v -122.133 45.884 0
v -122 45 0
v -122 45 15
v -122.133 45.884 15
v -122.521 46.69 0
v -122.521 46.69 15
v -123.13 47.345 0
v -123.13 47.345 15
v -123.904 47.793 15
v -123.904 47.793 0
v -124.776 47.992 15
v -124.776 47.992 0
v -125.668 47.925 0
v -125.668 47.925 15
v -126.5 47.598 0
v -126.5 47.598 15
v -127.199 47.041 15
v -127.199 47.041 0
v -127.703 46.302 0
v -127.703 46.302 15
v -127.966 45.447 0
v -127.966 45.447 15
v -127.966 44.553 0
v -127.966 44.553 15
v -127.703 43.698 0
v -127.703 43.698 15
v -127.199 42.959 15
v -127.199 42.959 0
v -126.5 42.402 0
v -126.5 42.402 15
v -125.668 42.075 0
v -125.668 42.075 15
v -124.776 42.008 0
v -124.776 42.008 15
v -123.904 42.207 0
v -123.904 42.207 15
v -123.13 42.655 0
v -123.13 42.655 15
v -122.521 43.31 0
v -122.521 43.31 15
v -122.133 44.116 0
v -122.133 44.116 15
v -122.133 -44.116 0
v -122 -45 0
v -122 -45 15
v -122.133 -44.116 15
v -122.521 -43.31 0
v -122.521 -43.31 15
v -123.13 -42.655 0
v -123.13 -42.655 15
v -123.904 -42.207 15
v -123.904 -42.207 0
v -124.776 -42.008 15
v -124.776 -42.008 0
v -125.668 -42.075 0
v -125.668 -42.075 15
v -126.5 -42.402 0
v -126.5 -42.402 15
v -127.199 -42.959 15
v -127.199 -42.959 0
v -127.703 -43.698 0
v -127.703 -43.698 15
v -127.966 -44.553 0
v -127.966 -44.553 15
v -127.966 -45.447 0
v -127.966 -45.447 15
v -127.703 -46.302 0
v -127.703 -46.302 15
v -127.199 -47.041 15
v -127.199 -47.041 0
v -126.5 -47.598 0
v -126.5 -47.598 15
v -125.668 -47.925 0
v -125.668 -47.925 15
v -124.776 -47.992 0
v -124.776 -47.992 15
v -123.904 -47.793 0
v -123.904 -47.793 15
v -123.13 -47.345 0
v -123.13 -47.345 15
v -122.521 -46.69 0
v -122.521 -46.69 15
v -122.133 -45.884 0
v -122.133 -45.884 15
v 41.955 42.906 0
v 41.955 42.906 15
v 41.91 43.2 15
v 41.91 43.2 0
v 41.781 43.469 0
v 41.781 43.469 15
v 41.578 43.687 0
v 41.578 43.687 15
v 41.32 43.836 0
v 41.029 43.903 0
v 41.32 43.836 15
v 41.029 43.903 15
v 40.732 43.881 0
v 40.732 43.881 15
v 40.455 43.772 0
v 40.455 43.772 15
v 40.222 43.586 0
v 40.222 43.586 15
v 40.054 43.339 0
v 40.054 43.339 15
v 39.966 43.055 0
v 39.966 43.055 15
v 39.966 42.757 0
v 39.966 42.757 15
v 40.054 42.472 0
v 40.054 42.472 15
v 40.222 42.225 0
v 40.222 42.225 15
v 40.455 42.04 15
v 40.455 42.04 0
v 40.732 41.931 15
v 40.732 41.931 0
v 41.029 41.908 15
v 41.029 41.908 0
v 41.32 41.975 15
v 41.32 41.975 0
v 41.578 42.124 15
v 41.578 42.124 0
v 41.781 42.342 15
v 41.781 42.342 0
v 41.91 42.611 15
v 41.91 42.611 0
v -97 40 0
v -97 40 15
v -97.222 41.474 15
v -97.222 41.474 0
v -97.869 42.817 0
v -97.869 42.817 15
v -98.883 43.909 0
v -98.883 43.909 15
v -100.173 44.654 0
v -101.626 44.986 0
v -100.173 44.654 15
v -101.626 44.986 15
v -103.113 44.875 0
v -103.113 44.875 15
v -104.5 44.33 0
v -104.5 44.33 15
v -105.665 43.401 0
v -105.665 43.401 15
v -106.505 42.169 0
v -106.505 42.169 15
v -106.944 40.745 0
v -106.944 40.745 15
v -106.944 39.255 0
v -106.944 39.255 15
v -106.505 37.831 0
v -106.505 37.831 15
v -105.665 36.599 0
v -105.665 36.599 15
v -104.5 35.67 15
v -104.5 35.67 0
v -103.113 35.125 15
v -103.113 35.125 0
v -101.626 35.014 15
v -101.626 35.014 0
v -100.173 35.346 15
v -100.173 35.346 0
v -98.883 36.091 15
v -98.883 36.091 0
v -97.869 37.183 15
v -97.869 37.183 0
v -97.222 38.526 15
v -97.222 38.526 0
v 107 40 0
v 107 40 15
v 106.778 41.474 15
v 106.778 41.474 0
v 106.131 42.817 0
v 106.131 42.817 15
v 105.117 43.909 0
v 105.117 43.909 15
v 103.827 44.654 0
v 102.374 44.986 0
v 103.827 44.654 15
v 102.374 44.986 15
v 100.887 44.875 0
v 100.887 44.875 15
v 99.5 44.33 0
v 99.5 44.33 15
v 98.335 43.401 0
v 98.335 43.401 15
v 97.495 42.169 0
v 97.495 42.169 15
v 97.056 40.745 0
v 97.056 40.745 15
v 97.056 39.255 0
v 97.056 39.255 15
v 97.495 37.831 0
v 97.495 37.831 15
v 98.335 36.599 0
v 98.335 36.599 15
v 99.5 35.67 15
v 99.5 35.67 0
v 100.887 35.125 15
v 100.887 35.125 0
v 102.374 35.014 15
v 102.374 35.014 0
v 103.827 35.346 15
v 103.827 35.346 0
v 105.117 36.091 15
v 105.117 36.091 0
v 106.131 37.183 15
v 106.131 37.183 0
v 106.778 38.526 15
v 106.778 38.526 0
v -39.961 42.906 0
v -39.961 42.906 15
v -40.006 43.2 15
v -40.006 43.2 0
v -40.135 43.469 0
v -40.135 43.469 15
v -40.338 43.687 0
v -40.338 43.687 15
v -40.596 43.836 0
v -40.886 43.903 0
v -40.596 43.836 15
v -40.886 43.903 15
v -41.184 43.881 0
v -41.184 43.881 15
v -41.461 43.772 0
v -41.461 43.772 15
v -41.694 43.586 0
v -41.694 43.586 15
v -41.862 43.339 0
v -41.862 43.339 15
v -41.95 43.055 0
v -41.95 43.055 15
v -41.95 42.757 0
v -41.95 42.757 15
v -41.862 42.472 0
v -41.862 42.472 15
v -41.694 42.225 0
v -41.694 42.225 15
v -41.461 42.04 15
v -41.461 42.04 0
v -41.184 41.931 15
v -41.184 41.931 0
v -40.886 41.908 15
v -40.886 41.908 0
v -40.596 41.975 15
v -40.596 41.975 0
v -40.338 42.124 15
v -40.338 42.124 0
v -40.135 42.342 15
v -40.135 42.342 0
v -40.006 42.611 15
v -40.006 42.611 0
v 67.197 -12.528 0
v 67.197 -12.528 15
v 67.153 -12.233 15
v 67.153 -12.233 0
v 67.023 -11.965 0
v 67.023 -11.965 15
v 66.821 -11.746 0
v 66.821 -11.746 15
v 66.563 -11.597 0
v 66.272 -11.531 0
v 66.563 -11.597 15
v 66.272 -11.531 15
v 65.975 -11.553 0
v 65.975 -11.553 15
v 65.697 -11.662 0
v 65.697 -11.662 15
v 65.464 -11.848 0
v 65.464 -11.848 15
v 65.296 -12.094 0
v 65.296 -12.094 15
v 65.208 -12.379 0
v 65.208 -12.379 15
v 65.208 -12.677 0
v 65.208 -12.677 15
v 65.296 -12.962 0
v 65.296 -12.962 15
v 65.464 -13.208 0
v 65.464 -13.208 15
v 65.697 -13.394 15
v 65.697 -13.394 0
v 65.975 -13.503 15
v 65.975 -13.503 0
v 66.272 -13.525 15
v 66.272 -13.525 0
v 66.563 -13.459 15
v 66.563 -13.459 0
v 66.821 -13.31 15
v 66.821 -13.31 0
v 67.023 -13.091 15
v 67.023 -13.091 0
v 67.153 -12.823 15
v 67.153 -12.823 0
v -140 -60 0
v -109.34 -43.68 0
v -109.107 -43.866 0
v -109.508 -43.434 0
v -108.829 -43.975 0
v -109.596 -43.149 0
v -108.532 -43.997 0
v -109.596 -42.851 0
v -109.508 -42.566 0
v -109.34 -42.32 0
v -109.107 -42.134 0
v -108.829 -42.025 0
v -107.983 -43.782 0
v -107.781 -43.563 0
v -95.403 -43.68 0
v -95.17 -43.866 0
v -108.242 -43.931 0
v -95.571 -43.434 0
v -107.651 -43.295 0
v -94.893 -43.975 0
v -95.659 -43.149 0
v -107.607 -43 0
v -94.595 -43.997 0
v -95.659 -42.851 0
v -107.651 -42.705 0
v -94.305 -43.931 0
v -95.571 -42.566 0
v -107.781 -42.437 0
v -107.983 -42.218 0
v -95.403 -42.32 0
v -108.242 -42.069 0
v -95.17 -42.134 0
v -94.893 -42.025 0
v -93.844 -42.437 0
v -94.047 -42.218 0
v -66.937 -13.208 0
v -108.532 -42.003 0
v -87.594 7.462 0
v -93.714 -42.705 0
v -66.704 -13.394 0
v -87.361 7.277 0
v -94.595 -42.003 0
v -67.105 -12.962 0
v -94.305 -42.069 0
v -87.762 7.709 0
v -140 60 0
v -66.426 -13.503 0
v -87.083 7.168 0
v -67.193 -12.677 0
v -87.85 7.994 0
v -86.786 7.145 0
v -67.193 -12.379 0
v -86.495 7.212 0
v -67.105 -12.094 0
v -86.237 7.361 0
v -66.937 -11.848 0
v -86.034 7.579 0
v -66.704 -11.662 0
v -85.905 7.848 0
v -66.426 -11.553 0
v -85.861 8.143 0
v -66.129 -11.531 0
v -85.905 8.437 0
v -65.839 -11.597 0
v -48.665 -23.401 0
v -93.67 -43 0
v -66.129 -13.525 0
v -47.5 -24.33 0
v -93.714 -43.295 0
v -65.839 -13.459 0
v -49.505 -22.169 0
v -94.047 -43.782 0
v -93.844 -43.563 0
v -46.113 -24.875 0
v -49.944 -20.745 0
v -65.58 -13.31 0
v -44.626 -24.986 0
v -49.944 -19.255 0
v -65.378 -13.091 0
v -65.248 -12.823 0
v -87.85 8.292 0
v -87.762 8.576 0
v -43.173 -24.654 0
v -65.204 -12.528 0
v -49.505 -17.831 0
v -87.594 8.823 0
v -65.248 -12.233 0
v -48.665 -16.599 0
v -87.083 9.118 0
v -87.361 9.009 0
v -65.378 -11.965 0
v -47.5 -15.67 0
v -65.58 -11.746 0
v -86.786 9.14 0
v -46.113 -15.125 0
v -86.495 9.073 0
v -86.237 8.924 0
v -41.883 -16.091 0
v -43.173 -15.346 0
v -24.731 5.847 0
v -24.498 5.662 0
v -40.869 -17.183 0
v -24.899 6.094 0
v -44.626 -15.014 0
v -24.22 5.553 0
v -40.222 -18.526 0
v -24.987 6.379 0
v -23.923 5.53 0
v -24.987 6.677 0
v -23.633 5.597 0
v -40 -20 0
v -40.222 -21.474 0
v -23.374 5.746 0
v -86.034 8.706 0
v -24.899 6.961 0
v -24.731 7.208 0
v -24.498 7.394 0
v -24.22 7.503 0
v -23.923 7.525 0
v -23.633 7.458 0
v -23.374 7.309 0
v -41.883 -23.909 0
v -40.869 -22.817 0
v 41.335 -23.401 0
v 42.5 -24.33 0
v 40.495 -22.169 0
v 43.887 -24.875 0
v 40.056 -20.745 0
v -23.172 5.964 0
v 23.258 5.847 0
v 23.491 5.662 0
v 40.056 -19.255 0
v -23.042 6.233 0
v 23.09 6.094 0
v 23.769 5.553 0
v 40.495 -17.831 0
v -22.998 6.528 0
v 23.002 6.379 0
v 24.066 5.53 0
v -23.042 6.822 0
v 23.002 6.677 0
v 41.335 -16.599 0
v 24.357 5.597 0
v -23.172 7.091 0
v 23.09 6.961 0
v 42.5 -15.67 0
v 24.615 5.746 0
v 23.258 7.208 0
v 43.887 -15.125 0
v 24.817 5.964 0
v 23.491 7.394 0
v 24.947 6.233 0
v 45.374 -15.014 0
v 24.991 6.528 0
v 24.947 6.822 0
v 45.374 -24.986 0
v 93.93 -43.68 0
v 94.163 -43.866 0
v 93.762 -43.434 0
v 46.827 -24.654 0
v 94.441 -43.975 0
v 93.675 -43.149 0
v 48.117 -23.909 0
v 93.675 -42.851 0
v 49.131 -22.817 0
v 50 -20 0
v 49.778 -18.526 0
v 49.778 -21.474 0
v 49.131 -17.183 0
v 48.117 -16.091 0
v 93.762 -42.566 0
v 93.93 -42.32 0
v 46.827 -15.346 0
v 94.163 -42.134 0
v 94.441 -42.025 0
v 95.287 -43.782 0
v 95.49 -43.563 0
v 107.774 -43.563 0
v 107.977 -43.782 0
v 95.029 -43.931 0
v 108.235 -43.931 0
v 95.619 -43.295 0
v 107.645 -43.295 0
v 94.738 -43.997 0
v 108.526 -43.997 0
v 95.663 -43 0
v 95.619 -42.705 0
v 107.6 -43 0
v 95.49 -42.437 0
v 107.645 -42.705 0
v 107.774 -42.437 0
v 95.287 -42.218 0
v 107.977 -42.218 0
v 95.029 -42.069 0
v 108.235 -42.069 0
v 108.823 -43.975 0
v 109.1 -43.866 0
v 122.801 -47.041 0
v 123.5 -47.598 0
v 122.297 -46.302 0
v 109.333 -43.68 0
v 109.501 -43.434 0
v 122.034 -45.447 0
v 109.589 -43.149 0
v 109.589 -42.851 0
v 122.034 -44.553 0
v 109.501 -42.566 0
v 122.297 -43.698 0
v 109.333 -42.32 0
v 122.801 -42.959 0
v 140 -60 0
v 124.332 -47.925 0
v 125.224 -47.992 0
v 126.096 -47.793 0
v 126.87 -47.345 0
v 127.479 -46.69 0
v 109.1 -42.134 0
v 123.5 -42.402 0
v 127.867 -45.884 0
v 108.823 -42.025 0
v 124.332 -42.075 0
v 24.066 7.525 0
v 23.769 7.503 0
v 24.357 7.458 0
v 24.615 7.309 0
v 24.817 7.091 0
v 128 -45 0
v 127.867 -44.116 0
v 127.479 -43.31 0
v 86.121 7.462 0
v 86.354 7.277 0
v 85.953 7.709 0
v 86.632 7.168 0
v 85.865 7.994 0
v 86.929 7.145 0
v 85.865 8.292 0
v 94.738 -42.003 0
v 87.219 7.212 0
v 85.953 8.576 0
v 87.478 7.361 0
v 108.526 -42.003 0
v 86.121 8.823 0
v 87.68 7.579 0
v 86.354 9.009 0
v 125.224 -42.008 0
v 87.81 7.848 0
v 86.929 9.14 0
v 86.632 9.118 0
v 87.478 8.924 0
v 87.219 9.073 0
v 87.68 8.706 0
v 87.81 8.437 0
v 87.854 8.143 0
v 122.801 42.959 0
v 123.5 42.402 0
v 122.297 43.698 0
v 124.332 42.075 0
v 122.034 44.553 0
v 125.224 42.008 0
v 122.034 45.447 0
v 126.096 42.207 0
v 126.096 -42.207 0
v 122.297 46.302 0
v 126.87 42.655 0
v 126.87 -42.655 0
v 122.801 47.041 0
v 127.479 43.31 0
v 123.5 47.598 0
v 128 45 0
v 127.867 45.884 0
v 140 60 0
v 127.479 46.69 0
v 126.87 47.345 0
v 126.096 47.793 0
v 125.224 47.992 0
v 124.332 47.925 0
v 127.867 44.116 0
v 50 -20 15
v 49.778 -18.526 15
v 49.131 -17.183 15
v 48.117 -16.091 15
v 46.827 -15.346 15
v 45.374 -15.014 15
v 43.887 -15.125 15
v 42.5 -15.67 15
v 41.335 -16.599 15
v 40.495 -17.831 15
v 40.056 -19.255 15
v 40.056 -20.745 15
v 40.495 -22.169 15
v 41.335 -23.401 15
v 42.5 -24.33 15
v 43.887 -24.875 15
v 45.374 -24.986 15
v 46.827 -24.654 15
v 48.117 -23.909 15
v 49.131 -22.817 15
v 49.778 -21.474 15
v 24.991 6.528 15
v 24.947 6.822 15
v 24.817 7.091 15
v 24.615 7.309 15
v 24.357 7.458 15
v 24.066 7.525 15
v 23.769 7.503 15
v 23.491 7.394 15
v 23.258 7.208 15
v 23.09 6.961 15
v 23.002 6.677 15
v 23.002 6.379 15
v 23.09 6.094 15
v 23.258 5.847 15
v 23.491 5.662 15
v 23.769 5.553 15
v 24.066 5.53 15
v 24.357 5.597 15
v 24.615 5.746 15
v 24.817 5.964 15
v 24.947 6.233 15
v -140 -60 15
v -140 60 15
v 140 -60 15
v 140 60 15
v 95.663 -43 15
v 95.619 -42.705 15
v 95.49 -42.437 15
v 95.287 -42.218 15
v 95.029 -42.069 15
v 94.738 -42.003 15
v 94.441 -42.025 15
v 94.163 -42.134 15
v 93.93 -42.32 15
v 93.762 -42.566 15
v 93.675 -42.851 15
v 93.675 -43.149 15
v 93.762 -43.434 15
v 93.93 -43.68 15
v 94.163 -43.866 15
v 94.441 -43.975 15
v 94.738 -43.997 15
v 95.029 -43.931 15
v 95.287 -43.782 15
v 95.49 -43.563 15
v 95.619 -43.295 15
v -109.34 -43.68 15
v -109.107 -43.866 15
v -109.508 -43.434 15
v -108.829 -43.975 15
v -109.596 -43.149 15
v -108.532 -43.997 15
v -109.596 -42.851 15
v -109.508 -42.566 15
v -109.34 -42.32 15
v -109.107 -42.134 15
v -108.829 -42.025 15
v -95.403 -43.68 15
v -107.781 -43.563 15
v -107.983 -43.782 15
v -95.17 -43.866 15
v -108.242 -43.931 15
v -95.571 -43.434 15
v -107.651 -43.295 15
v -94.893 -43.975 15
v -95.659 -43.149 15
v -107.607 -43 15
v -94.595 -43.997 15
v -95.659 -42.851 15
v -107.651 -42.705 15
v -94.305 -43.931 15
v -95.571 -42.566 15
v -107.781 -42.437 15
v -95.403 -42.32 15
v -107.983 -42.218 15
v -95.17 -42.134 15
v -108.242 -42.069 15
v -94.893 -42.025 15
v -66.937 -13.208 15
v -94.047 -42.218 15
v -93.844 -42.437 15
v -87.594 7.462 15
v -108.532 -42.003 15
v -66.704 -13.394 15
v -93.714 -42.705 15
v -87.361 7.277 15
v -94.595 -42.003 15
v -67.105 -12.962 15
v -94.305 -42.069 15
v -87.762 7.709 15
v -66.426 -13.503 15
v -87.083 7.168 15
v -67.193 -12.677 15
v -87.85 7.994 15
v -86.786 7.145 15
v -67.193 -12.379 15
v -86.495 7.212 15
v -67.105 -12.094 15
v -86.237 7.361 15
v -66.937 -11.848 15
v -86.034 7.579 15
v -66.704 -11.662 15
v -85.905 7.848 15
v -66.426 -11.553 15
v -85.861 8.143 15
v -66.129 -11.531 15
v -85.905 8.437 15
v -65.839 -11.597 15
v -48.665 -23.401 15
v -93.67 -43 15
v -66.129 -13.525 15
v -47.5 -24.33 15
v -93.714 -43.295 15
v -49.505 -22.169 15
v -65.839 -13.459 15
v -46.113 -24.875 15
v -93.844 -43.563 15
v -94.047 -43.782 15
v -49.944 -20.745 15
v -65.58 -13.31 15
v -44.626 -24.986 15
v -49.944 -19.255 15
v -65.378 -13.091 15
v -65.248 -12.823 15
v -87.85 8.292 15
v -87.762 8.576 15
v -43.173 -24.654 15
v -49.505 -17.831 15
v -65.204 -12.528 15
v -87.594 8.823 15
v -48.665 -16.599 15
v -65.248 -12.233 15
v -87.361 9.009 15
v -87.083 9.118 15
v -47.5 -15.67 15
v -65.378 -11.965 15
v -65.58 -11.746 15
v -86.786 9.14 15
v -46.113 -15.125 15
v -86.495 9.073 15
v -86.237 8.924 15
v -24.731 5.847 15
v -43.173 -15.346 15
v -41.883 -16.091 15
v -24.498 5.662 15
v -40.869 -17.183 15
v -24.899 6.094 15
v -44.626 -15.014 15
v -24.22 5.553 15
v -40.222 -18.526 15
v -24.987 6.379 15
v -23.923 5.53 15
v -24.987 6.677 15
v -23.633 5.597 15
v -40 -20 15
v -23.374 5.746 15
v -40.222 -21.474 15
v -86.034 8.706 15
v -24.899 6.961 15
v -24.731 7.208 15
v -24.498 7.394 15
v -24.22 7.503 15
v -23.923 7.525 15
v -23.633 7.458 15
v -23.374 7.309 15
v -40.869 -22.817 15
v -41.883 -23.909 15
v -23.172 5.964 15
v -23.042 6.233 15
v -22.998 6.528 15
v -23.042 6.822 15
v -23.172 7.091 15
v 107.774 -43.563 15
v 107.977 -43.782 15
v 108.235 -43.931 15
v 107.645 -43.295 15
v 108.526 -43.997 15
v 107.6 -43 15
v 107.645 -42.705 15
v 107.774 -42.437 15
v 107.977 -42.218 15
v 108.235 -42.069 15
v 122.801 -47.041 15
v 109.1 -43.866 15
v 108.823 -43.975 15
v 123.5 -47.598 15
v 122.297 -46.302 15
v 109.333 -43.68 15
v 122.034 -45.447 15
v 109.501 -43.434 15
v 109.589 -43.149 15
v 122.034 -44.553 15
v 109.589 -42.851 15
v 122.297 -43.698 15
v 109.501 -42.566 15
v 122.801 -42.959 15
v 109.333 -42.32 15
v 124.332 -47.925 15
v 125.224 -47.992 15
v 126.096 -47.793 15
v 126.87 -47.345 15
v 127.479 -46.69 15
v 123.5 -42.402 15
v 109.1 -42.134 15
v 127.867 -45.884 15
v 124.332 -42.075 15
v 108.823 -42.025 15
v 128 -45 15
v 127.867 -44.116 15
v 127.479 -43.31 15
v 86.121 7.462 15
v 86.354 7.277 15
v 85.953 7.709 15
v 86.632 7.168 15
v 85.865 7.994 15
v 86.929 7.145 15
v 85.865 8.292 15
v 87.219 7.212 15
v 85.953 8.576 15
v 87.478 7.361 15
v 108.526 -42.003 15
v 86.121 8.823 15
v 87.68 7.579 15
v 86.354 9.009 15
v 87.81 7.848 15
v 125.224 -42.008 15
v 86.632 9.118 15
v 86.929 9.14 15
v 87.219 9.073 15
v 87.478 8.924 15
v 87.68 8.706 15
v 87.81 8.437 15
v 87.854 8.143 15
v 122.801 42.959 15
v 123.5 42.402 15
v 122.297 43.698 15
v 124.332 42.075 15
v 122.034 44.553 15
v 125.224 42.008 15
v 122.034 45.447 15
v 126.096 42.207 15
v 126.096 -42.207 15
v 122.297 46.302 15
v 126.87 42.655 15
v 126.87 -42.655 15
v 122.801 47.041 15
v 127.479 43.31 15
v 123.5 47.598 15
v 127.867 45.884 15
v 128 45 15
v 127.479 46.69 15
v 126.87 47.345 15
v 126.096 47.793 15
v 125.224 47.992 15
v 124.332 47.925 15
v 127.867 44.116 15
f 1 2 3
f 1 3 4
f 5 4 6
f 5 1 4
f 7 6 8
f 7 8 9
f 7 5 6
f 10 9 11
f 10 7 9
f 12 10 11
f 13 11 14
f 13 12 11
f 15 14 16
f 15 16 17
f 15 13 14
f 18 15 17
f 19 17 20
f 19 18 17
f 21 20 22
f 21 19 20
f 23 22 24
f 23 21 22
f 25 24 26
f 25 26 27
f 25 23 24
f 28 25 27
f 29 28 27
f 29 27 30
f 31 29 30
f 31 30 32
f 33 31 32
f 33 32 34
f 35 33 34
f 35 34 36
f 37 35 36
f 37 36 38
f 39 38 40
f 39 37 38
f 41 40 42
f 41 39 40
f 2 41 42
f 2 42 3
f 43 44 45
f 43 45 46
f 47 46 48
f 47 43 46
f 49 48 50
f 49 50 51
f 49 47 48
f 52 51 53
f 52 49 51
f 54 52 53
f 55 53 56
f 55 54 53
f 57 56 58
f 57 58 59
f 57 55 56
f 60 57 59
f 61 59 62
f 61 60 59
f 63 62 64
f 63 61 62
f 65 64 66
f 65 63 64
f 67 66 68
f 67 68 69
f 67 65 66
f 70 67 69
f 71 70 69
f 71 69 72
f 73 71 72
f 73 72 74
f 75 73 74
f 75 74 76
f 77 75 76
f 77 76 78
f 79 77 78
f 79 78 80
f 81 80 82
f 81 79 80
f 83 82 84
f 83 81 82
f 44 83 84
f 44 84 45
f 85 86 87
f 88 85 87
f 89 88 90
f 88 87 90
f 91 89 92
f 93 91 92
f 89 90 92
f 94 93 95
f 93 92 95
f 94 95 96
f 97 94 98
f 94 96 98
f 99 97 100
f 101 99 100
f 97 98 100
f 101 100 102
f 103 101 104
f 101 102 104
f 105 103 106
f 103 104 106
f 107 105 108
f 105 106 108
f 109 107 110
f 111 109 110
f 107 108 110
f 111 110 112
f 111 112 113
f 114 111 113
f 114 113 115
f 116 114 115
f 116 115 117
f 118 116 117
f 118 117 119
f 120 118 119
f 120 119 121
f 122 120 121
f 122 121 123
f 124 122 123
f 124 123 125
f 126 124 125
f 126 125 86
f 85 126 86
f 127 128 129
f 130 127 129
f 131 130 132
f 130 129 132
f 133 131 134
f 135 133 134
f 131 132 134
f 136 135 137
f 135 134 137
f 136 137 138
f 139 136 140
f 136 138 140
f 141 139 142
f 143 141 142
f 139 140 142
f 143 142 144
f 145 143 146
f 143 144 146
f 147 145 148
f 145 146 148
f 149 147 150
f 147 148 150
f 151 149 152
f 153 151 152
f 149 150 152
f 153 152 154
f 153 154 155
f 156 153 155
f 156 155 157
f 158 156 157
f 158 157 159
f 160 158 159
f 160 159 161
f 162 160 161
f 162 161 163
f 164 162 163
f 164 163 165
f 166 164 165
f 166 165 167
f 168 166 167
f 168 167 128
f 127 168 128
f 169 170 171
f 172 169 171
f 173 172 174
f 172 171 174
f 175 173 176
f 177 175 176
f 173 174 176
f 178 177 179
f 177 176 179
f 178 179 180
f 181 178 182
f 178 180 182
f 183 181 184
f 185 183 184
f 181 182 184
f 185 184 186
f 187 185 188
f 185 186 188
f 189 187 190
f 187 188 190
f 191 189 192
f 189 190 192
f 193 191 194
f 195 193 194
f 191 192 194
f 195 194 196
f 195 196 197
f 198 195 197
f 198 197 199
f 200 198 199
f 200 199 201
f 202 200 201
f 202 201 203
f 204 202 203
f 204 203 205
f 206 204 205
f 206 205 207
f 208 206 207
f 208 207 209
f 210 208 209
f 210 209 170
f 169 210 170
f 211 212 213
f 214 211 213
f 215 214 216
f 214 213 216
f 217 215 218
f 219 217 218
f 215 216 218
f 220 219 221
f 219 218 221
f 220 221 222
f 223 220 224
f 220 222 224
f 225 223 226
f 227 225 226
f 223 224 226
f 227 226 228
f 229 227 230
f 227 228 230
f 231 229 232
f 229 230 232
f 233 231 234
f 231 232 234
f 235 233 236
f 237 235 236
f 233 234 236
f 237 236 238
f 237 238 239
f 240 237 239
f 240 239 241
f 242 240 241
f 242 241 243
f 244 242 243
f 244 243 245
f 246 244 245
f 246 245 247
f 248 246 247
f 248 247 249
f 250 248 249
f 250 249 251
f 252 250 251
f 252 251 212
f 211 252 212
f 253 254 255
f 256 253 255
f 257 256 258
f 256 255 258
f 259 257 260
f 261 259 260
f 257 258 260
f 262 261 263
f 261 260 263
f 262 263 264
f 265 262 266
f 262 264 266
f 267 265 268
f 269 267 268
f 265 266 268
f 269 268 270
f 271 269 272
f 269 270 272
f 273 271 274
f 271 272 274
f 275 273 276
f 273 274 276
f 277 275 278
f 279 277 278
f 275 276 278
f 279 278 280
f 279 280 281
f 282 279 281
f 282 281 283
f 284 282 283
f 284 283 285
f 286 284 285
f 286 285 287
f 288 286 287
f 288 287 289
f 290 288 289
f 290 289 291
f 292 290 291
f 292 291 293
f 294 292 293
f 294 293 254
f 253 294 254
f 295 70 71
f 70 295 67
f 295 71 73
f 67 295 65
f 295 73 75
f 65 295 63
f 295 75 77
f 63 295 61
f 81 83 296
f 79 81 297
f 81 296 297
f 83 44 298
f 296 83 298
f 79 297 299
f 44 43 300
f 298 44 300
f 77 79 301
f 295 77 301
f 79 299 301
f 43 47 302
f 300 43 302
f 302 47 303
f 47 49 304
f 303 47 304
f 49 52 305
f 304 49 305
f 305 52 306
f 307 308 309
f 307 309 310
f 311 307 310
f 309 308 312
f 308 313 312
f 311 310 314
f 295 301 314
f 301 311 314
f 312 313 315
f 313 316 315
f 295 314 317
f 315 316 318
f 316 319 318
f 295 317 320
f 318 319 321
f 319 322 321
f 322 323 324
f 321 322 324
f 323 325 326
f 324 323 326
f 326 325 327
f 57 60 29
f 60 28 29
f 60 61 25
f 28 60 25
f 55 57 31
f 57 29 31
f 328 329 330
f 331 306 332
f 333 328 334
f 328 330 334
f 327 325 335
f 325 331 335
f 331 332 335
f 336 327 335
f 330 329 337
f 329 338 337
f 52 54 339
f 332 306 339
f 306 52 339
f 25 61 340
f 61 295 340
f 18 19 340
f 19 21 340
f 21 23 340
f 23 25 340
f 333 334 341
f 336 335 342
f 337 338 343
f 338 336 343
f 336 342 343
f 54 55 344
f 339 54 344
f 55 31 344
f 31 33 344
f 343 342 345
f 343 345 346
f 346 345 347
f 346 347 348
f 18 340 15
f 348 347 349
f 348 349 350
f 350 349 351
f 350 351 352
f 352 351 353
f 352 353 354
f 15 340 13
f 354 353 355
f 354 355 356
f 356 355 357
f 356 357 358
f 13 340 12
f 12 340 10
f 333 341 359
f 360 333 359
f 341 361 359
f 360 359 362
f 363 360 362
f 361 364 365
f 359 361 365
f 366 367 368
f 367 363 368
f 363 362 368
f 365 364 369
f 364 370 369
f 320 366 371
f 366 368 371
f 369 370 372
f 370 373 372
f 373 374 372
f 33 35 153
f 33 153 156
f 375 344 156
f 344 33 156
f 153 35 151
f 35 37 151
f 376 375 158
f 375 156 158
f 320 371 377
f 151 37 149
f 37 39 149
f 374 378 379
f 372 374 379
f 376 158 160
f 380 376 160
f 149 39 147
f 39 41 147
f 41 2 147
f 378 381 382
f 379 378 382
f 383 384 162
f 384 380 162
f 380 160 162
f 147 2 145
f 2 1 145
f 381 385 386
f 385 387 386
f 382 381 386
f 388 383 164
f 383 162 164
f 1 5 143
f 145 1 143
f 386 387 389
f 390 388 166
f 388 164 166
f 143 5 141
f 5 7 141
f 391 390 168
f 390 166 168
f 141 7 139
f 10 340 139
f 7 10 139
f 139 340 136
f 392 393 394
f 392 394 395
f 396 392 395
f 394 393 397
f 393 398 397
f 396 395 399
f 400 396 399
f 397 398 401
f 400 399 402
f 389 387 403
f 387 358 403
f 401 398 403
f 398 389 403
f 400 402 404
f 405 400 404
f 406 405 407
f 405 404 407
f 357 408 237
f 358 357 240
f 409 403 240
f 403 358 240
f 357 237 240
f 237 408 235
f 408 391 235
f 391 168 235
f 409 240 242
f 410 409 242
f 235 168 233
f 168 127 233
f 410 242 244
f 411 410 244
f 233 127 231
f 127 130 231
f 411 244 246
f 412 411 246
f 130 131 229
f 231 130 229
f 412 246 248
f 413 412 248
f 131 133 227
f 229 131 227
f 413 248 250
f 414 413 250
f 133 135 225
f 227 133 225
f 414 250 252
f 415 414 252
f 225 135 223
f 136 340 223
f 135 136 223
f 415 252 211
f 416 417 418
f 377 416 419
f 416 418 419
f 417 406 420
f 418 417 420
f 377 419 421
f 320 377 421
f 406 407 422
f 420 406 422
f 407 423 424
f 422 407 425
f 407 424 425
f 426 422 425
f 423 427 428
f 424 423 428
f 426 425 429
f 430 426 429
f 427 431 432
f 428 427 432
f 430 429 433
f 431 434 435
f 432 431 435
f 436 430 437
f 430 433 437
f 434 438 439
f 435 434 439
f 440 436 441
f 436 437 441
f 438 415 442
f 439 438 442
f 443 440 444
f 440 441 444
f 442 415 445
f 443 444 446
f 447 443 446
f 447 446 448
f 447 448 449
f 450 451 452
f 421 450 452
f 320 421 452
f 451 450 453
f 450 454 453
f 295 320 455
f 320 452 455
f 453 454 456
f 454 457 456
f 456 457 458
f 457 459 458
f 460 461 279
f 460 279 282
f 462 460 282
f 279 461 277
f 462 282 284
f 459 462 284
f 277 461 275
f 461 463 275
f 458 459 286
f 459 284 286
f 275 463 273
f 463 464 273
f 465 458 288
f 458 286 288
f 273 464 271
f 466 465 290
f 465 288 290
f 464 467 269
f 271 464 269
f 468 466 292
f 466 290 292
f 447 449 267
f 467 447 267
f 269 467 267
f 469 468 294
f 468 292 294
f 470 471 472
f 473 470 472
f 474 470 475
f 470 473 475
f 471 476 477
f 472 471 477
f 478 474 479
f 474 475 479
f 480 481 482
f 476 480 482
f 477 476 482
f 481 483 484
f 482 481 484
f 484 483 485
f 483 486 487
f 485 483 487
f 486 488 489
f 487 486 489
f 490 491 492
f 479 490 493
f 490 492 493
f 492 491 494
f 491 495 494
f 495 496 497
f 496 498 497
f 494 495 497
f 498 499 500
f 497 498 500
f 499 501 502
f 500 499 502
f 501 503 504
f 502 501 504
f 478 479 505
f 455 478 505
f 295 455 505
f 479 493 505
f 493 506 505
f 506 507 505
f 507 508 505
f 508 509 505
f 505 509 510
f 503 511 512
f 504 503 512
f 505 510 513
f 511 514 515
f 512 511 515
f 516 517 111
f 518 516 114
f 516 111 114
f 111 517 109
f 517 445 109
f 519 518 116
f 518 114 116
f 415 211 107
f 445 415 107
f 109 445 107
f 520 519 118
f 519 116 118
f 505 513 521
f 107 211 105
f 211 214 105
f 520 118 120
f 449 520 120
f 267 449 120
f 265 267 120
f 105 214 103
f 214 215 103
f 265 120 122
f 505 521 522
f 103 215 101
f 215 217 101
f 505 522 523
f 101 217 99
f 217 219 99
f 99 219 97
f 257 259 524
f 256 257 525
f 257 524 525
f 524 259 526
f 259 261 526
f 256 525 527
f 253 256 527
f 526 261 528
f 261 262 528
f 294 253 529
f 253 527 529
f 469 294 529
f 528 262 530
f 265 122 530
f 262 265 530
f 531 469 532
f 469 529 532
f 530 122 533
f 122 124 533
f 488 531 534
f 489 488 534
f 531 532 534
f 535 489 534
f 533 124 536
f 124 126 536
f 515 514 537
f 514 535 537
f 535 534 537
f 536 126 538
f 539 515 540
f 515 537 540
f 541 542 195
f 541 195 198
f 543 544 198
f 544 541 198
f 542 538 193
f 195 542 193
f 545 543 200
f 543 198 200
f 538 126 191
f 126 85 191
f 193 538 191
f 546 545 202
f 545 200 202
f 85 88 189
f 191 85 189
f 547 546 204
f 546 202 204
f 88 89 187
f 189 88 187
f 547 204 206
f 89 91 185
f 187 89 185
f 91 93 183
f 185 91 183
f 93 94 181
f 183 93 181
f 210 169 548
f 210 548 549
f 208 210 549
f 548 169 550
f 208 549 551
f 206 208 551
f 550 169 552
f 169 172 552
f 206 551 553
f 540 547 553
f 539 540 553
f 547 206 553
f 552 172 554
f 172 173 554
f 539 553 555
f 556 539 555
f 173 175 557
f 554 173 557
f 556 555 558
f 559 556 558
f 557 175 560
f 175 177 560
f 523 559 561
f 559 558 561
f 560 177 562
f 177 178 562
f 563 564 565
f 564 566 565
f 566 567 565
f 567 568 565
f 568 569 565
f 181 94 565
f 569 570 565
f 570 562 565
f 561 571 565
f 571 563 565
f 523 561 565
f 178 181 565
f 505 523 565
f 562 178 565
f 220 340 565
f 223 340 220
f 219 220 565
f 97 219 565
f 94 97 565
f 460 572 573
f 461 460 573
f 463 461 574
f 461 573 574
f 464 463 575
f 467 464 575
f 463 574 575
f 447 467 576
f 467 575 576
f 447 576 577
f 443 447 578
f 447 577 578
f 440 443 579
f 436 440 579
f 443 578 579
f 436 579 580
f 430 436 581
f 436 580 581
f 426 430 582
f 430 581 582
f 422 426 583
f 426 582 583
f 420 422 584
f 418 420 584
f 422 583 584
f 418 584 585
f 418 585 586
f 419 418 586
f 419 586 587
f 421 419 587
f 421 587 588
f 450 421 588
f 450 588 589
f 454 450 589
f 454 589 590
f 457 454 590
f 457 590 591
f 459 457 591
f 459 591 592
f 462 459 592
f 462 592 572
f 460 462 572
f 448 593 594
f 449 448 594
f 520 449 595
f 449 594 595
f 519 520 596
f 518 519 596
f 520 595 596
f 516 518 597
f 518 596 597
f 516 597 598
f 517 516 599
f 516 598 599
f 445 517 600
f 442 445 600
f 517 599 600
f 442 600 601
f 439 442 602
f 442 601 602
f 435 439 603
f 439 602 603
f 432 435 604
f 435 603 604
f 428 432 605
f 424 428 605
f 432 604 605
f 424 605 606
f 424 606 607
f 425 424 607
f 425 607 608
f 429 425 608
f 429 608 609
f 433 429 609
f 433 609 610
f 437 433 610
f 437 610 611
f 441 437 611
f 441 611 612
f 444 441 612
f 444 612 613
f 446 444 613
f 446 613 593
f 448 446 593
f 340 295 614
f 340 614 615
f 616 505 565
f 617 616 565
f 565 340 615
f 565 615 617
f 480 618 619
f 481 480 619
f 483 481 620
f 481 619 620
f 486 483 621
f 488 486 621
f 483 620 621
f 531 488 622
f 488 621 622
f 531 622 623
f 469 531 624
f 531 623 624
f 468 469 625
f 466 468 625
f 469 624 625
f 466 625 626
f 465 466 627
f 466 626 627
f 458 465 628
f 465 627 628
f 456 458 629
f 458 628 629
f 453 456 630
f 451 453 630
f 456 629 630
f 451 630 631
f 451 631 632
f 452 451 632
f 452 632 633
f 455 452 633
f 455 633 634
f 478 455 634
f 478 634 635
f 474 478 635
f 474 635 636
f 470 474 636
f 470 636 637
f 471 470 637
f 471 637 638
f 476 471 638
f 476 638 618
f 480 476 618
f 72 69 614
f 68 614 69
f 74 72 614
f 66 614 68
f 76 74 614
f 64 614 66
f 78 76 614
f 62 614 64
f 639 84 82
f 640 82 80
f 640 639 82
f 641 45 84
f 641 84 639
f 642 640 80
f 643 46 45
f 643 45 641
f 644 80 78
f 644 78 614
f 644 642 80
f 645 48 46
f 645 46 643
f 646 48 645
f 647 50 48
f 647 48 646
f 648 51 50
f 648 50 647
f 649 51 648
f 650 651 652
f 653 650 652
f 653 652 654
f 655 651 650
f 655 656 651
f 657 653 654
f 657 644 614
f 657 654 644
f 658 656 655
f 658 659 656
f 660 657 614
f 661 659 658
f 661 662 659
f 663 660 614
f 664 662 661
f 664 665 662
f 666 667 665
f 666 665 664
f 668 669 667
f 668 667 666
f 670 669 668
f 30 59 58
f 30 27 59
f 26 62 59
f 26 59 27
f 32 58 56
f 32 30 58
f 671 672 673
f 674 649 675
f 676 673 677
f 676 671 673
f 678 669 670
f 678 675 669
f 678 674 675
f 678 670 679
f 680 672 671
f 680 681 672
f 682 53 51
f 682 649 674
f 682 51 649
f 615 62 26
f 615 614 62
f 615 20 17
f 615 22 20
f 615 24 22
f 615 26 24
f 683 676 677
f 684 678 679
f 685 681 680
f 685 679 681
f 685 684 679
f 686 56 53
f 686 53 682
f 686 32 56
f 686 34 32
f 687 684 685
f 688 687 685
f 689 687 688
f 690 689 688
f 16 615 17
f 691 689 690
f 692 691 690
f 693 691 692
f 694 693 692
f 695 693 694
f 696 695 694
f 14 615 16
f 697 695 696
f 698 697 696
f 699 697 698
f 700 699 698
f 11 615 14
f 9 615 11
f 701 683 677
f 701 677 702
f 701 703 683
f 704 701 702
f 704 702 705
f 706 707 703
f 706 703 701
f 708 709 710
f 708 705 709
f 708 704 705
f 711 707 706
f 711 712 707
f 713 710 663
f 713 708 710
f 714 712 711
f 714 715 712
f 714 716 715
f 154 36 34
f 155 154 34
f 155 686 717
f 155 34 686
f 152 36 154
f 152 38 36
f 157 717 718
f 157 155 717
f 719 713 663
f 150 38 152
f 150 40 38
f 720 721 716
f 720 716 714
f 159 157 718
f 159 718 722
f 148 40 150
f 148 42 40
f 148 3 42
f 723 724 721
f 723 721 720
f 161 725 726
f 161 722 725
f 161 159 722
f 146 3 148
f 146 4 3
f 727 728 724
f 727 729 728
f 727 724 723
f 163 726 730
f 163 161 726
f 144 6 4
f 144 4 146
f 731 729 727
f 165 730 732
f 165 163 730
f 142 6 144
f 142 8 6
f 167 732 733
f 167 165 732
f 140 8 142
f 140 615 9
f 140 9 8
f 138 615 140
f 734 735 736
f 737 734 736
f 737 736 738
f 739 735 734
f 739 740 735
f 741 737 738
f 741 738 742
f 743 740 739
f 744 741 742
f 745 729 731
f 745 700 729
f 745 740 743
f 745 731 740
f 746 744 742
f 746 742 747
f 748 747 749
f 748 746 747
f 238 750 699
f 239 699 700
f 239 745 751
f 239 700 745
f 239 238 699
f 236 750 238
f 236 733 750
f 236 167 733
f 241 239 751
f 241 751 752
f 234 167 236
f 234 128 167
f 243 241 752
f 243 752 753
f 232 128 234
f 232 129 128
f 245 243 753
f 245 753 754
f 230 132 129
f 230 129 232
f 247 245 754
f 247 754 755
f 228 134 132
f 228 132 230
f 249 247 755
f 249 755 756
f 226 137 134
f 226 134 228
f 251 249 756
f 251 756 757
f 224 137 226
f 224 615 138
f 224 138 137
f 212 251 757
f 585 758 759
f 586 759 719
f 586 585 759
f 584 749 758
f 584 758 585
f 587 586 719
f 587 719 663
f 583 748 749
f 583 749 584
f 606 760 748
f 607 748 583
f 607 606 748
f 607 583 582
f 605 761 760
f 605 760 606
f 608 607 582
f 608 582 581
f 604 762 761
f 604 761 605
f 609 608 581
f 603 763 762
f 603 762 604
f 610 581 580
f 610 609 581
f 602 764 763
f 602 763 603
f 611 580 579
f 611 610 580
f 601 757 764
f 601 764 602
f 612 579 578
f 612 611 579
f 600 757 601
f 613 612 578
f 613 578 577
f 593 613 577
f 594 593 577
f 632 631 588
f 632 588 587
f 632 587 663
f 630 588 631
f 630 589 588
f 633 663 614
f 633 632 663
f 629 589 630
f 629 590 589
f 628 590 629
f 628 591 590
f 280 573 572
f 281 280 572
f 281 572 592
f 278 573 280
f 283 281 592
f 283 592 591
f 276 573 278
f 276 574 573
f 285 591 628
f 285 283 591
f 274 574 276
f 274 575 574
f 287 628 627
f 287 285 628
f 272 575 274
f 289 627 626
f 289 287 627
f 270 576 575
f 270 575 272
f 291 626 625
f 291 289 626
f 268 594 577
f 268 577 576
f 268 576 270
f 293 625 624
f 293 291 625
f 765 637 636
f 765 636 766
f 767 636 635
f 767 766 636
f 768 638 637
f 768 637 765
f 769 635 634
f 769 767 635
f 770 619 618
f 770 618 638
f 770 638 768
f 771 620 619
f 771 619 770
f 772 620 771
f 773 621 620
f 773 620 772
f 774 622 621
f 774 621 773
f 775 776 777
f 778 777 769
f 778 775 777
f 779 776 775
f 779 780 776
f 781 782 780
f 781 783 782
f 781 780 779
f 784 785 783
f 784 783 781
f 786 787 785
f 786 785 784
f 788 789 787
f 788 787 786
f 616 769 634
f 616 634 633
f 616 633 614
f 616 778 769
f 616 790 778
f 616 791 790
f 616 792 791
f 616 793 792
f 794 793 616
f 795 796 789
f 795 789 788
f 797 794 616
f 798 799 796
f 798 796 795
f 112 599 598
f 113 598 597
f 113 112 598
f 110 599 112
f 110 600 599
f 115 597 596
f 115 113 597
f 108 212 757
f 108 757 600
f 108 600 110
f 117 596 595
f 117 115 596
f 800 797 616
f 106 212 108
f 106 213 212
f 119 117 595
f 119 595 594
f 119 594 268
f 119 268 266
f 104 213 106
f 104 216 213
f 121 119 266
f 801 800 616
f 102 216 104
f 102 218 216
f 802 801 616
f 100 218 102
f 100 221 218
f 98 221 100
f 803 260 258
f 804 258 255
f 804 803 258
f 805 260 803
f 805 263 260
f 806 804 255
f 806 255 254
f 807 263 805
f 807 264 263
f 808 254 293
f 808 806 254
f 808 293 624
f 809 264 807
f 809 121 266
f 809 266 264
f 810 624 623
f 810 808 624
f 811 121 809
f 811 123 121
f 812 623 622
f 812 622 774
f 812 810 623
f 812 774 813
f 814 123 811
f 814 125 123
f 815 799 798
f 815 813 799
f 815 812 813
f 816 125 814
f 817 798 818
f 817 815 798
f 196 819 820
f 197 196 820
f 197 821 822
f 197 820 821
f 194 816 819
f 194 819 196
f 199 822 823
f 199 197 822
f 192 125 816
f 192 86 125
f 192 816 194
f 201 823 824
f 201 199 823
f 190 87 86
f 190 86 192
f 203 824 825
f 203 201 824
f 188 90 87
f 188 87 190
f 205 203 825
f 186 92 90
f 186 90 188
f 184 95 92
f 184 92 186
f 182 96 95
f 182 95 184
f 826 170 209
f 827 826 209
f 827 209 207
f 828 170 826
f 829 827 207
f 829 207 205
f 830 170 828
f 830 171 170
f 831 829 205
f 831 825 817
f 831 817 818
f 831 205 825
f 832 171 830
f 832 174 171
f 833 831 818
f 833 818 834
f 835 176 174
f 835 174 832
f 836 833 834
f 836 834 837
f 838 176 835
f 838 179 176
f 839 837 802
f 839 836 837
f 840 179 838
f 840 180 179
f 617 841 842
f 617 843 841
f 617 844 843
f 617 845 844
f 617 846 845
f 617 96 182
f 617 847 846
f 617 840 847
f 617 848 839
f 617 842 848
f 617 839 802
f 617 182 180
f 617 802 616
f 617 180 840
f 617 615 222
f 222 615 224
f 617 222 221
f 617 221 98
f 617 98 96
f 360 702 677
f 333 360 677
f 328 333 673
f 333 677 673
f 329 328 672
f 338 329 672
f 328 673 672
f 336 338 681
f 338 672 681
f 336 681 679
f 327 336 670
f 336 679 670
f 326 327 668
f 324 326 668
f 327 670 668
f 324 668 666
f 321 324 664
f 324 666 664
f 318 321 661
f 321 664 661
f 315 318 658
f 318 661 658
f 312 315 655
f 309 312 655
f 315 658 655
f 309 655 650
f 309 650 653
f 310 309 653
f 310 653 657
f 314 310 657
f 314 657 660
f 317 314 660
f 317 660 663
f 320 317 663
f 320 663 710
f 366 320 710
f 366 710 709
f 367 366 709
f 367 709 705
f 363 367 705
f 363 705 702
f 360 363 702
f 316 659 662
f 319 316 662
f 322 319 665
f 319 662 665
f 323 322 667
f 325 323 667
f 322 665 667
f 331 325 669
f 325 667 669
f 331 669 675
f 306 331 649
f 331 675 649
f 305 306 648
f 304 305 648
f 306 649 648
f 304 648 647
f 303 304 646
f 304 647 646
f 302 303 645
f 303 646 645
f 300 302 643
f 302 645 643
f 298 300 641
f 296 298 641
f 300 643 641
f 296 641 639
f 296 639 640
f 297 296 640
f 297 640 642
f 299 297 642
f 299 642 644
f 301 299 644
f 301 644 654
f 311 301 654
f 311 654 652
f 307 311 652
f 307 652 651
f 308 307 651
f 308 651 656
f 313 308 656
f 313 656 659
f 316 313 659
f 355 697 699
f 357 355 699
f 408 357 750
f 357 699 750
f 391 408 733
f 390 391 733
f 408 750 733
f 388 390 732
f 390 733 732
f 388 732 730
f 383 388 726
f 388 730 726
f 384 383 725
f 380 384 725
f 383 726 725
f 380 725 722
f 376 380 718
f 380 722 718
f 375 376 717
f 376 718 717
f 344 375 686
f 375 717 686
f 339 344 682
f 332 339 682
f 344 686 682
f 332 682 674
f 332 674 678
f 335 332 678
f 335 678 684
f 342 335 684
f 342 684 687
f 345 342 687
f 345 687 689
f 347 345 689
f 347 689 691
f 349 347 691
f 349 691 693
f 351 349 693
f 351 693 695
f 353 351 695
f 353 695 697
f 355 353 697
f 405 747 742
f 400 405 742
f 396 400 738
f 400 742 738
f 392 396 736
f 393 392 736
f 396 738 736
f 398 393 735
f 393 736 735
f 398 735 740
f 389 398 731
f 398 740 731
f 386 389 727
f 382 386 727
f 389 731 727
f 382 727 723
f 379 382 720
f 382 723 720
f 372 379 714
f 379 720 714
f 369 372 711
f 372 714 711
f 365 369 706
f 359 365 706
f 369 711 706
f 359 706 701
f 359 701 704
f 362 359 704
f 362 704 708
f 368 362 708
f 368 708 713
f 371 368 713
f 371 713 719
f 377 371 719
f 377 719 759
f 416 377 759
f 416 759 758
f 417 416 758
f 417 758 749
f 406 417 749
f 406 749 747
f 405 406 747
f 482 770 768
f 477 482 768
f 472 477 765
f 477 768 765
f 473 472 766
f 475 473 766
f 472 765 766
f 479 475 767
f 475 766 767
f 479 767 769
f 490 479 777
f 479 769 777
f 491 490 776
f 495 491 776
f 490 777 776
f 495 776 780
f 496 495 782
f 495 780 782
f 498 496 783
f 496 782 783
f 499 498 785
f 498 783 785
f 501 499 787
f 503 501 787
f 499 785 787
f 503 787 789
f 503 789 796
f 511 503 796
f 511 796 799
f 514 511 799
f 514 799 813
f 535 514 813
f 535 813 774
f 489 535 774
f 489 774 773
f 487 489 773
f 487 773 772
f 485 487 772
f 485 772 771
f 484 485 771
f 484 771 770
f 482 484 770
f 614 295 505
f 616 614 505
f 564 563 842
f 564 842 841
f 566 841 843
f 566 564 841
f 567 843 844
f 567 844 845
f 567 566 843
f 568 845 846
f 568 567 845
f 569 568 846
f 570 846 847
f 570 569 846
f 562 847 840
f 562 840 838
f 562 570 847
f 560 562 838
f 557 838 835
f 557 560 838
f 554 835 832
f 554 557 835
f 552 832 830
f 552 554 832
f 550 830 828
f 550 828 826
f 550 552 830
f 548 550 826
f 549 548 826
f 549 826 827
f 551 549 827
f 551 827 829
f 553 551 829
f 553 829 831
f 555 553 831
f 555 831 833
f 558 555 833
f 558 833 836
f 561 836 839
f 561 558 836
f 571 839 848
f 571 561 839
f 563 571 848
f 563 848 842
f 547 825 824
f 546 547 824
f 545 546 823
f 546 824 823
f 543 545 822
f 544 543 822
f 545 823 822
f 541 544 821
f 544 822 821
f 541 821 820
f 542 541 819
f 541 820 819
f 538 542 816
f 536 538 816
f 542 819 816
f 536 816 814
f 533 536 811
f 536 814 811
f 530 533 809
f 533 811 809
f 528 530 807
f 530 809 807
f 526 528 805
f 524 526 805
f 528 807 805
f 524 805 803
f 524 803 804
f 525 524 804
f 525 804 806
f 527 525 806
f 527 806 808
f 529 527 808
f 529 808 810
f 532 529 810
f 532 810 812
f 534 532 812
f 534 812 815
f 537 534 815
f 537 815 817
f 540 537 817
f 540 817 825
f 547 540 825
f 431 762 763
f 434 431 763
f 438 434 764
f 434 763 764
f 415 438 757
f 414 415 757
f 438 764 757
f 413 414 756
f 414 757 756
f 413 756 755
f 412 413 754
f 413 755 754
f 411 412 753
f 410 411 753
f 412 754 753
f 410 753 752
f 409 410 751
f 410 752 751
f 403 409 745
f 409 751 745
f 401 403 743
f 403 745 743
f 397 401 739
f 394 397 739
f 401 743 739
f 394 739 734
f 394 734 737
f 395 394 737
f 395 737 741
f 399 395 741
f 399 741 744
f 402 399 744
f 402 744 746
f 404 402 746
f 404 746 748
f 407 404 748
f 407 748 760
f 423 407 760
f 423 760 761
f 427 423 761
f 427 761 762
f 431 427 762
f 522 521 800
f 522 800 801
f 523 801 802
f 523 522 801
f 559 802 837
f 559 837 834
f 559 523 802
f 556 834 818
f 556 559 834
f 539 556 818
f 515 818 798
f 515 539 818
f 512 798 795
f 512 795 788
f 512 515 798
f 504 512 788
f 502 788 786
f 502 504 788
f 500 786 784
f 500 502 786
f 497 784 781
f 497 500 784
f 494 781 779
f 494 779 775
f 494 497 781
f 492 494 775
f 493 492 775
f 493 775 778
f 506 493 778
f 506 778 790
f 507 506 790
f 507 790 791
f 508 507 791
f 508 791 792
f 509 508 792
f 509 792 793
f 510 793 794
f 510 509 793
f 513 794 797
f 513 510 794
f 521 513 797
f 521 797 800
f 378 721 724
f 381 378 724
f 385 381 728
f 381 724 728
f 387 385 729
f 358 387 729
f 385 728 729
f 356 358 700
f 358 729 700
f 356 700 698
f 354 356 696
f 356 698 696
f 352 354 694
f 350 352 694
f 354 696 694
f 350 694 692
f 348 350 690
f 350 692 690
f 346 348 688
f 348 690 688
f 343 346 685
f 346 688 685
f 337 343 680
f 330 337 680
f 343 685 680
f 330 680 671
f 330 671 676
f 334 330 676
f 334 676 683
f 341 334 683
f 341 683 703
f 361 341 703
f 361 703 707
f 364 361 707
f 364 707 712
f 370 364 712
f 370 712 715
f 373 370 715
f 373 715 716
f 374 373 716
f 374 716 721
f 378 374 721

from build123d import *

# Parameters (mm, degrees)
SKETCH1_W           = 280
SKETCH1_H           = 120
SKETCH1_R           = 3
BOSS_EXTRUDE1_DEPTH = 15
SKETCH2_R           = 5
SKETCH2_R_2         = 1
CUT_EXTRUDE1_DEPTH  = 30


with BuildPart() as part:
    # Sketch1 → Boss-Extrude1 (new body)
    with BuildSketch(Plane.XY):
        Rectangle(SKETCH1_W, SKETCH1_H)
        with Locations((-125, 45)):
            Circle(SKETCH1_R, mode=Mode.SUBTRACT)
        with Locations((125, 45)):
            Circle(SKETCH1_R, mode=Mode.SUBTRACT)
        with Locations((125, -45)):
            Circle(SKETCH1_R, mode=Mode.SUBTRACT)
        with Locations((-125, -45)):
            Circle(SKETCH1_R, mode=Mode.SUBTRACT)
    extrude(amount=BOSS_EXTRUDE1_DEPTH)

    # Sketch2 → Cut-Extrude1 (cut)
    with BuildSketch(Plane.XY.offset(15)):
        with Locations((102, 40)):
            Circle(SKETCH2_R)
        with Locations((45, -20)):
            Circle(SKETCH2_R)
        with Locations((-45, -20)):
            Circle(SKETCH2_R)
        with Locations((-102, 40)):
            Circle(SKETCH2_R)
        with Locations(Location((108.600249206, -43, 0), (0, 0, 180))):
            Circle(SKETCH2_R_2)
        with Locations((94.663331879, -43)):
            Circle(SKETCH2_R_2)
        with Locations((86.854067304, 8.142611191)):
            Circle(SKETCH2_R_2)
        with Locations((66.197255592, -12.527826613)):
            Circle(SKETCH2_R_2)
        with Locations((23.991204862, 6.527590511)):
            Circle(SKETCH2_R_2)
        with Locations((40.954554728, 42.905606098)):
            Circle(SKETCH2_R_2)
        with Locations((-23.997872984, 6.527590511)):
            Circle(SKETCH2_R_2)
        with Locations((-40.96122285, 42.905606098)):
            Circle(SKETCH2_R_2)
        with Locations((-86.860735426, 8.142611191)):
            Circle(SKETCH2_R_2)
        with Locations((-66.203923713, -12.527826613)):
            Circle(SKETCH2_R_2)
        with Locations((-108.606917327, -43)):
            Circle(SKETCH2_R_2)
        with Locations((-94.67, -43)):
            Circle(SKETCH2_R_2)
    extrude(amount=-CUT_EXTRUDE1_DEPTH, mode=Mode.SUBTRACT)


solid = part.part
